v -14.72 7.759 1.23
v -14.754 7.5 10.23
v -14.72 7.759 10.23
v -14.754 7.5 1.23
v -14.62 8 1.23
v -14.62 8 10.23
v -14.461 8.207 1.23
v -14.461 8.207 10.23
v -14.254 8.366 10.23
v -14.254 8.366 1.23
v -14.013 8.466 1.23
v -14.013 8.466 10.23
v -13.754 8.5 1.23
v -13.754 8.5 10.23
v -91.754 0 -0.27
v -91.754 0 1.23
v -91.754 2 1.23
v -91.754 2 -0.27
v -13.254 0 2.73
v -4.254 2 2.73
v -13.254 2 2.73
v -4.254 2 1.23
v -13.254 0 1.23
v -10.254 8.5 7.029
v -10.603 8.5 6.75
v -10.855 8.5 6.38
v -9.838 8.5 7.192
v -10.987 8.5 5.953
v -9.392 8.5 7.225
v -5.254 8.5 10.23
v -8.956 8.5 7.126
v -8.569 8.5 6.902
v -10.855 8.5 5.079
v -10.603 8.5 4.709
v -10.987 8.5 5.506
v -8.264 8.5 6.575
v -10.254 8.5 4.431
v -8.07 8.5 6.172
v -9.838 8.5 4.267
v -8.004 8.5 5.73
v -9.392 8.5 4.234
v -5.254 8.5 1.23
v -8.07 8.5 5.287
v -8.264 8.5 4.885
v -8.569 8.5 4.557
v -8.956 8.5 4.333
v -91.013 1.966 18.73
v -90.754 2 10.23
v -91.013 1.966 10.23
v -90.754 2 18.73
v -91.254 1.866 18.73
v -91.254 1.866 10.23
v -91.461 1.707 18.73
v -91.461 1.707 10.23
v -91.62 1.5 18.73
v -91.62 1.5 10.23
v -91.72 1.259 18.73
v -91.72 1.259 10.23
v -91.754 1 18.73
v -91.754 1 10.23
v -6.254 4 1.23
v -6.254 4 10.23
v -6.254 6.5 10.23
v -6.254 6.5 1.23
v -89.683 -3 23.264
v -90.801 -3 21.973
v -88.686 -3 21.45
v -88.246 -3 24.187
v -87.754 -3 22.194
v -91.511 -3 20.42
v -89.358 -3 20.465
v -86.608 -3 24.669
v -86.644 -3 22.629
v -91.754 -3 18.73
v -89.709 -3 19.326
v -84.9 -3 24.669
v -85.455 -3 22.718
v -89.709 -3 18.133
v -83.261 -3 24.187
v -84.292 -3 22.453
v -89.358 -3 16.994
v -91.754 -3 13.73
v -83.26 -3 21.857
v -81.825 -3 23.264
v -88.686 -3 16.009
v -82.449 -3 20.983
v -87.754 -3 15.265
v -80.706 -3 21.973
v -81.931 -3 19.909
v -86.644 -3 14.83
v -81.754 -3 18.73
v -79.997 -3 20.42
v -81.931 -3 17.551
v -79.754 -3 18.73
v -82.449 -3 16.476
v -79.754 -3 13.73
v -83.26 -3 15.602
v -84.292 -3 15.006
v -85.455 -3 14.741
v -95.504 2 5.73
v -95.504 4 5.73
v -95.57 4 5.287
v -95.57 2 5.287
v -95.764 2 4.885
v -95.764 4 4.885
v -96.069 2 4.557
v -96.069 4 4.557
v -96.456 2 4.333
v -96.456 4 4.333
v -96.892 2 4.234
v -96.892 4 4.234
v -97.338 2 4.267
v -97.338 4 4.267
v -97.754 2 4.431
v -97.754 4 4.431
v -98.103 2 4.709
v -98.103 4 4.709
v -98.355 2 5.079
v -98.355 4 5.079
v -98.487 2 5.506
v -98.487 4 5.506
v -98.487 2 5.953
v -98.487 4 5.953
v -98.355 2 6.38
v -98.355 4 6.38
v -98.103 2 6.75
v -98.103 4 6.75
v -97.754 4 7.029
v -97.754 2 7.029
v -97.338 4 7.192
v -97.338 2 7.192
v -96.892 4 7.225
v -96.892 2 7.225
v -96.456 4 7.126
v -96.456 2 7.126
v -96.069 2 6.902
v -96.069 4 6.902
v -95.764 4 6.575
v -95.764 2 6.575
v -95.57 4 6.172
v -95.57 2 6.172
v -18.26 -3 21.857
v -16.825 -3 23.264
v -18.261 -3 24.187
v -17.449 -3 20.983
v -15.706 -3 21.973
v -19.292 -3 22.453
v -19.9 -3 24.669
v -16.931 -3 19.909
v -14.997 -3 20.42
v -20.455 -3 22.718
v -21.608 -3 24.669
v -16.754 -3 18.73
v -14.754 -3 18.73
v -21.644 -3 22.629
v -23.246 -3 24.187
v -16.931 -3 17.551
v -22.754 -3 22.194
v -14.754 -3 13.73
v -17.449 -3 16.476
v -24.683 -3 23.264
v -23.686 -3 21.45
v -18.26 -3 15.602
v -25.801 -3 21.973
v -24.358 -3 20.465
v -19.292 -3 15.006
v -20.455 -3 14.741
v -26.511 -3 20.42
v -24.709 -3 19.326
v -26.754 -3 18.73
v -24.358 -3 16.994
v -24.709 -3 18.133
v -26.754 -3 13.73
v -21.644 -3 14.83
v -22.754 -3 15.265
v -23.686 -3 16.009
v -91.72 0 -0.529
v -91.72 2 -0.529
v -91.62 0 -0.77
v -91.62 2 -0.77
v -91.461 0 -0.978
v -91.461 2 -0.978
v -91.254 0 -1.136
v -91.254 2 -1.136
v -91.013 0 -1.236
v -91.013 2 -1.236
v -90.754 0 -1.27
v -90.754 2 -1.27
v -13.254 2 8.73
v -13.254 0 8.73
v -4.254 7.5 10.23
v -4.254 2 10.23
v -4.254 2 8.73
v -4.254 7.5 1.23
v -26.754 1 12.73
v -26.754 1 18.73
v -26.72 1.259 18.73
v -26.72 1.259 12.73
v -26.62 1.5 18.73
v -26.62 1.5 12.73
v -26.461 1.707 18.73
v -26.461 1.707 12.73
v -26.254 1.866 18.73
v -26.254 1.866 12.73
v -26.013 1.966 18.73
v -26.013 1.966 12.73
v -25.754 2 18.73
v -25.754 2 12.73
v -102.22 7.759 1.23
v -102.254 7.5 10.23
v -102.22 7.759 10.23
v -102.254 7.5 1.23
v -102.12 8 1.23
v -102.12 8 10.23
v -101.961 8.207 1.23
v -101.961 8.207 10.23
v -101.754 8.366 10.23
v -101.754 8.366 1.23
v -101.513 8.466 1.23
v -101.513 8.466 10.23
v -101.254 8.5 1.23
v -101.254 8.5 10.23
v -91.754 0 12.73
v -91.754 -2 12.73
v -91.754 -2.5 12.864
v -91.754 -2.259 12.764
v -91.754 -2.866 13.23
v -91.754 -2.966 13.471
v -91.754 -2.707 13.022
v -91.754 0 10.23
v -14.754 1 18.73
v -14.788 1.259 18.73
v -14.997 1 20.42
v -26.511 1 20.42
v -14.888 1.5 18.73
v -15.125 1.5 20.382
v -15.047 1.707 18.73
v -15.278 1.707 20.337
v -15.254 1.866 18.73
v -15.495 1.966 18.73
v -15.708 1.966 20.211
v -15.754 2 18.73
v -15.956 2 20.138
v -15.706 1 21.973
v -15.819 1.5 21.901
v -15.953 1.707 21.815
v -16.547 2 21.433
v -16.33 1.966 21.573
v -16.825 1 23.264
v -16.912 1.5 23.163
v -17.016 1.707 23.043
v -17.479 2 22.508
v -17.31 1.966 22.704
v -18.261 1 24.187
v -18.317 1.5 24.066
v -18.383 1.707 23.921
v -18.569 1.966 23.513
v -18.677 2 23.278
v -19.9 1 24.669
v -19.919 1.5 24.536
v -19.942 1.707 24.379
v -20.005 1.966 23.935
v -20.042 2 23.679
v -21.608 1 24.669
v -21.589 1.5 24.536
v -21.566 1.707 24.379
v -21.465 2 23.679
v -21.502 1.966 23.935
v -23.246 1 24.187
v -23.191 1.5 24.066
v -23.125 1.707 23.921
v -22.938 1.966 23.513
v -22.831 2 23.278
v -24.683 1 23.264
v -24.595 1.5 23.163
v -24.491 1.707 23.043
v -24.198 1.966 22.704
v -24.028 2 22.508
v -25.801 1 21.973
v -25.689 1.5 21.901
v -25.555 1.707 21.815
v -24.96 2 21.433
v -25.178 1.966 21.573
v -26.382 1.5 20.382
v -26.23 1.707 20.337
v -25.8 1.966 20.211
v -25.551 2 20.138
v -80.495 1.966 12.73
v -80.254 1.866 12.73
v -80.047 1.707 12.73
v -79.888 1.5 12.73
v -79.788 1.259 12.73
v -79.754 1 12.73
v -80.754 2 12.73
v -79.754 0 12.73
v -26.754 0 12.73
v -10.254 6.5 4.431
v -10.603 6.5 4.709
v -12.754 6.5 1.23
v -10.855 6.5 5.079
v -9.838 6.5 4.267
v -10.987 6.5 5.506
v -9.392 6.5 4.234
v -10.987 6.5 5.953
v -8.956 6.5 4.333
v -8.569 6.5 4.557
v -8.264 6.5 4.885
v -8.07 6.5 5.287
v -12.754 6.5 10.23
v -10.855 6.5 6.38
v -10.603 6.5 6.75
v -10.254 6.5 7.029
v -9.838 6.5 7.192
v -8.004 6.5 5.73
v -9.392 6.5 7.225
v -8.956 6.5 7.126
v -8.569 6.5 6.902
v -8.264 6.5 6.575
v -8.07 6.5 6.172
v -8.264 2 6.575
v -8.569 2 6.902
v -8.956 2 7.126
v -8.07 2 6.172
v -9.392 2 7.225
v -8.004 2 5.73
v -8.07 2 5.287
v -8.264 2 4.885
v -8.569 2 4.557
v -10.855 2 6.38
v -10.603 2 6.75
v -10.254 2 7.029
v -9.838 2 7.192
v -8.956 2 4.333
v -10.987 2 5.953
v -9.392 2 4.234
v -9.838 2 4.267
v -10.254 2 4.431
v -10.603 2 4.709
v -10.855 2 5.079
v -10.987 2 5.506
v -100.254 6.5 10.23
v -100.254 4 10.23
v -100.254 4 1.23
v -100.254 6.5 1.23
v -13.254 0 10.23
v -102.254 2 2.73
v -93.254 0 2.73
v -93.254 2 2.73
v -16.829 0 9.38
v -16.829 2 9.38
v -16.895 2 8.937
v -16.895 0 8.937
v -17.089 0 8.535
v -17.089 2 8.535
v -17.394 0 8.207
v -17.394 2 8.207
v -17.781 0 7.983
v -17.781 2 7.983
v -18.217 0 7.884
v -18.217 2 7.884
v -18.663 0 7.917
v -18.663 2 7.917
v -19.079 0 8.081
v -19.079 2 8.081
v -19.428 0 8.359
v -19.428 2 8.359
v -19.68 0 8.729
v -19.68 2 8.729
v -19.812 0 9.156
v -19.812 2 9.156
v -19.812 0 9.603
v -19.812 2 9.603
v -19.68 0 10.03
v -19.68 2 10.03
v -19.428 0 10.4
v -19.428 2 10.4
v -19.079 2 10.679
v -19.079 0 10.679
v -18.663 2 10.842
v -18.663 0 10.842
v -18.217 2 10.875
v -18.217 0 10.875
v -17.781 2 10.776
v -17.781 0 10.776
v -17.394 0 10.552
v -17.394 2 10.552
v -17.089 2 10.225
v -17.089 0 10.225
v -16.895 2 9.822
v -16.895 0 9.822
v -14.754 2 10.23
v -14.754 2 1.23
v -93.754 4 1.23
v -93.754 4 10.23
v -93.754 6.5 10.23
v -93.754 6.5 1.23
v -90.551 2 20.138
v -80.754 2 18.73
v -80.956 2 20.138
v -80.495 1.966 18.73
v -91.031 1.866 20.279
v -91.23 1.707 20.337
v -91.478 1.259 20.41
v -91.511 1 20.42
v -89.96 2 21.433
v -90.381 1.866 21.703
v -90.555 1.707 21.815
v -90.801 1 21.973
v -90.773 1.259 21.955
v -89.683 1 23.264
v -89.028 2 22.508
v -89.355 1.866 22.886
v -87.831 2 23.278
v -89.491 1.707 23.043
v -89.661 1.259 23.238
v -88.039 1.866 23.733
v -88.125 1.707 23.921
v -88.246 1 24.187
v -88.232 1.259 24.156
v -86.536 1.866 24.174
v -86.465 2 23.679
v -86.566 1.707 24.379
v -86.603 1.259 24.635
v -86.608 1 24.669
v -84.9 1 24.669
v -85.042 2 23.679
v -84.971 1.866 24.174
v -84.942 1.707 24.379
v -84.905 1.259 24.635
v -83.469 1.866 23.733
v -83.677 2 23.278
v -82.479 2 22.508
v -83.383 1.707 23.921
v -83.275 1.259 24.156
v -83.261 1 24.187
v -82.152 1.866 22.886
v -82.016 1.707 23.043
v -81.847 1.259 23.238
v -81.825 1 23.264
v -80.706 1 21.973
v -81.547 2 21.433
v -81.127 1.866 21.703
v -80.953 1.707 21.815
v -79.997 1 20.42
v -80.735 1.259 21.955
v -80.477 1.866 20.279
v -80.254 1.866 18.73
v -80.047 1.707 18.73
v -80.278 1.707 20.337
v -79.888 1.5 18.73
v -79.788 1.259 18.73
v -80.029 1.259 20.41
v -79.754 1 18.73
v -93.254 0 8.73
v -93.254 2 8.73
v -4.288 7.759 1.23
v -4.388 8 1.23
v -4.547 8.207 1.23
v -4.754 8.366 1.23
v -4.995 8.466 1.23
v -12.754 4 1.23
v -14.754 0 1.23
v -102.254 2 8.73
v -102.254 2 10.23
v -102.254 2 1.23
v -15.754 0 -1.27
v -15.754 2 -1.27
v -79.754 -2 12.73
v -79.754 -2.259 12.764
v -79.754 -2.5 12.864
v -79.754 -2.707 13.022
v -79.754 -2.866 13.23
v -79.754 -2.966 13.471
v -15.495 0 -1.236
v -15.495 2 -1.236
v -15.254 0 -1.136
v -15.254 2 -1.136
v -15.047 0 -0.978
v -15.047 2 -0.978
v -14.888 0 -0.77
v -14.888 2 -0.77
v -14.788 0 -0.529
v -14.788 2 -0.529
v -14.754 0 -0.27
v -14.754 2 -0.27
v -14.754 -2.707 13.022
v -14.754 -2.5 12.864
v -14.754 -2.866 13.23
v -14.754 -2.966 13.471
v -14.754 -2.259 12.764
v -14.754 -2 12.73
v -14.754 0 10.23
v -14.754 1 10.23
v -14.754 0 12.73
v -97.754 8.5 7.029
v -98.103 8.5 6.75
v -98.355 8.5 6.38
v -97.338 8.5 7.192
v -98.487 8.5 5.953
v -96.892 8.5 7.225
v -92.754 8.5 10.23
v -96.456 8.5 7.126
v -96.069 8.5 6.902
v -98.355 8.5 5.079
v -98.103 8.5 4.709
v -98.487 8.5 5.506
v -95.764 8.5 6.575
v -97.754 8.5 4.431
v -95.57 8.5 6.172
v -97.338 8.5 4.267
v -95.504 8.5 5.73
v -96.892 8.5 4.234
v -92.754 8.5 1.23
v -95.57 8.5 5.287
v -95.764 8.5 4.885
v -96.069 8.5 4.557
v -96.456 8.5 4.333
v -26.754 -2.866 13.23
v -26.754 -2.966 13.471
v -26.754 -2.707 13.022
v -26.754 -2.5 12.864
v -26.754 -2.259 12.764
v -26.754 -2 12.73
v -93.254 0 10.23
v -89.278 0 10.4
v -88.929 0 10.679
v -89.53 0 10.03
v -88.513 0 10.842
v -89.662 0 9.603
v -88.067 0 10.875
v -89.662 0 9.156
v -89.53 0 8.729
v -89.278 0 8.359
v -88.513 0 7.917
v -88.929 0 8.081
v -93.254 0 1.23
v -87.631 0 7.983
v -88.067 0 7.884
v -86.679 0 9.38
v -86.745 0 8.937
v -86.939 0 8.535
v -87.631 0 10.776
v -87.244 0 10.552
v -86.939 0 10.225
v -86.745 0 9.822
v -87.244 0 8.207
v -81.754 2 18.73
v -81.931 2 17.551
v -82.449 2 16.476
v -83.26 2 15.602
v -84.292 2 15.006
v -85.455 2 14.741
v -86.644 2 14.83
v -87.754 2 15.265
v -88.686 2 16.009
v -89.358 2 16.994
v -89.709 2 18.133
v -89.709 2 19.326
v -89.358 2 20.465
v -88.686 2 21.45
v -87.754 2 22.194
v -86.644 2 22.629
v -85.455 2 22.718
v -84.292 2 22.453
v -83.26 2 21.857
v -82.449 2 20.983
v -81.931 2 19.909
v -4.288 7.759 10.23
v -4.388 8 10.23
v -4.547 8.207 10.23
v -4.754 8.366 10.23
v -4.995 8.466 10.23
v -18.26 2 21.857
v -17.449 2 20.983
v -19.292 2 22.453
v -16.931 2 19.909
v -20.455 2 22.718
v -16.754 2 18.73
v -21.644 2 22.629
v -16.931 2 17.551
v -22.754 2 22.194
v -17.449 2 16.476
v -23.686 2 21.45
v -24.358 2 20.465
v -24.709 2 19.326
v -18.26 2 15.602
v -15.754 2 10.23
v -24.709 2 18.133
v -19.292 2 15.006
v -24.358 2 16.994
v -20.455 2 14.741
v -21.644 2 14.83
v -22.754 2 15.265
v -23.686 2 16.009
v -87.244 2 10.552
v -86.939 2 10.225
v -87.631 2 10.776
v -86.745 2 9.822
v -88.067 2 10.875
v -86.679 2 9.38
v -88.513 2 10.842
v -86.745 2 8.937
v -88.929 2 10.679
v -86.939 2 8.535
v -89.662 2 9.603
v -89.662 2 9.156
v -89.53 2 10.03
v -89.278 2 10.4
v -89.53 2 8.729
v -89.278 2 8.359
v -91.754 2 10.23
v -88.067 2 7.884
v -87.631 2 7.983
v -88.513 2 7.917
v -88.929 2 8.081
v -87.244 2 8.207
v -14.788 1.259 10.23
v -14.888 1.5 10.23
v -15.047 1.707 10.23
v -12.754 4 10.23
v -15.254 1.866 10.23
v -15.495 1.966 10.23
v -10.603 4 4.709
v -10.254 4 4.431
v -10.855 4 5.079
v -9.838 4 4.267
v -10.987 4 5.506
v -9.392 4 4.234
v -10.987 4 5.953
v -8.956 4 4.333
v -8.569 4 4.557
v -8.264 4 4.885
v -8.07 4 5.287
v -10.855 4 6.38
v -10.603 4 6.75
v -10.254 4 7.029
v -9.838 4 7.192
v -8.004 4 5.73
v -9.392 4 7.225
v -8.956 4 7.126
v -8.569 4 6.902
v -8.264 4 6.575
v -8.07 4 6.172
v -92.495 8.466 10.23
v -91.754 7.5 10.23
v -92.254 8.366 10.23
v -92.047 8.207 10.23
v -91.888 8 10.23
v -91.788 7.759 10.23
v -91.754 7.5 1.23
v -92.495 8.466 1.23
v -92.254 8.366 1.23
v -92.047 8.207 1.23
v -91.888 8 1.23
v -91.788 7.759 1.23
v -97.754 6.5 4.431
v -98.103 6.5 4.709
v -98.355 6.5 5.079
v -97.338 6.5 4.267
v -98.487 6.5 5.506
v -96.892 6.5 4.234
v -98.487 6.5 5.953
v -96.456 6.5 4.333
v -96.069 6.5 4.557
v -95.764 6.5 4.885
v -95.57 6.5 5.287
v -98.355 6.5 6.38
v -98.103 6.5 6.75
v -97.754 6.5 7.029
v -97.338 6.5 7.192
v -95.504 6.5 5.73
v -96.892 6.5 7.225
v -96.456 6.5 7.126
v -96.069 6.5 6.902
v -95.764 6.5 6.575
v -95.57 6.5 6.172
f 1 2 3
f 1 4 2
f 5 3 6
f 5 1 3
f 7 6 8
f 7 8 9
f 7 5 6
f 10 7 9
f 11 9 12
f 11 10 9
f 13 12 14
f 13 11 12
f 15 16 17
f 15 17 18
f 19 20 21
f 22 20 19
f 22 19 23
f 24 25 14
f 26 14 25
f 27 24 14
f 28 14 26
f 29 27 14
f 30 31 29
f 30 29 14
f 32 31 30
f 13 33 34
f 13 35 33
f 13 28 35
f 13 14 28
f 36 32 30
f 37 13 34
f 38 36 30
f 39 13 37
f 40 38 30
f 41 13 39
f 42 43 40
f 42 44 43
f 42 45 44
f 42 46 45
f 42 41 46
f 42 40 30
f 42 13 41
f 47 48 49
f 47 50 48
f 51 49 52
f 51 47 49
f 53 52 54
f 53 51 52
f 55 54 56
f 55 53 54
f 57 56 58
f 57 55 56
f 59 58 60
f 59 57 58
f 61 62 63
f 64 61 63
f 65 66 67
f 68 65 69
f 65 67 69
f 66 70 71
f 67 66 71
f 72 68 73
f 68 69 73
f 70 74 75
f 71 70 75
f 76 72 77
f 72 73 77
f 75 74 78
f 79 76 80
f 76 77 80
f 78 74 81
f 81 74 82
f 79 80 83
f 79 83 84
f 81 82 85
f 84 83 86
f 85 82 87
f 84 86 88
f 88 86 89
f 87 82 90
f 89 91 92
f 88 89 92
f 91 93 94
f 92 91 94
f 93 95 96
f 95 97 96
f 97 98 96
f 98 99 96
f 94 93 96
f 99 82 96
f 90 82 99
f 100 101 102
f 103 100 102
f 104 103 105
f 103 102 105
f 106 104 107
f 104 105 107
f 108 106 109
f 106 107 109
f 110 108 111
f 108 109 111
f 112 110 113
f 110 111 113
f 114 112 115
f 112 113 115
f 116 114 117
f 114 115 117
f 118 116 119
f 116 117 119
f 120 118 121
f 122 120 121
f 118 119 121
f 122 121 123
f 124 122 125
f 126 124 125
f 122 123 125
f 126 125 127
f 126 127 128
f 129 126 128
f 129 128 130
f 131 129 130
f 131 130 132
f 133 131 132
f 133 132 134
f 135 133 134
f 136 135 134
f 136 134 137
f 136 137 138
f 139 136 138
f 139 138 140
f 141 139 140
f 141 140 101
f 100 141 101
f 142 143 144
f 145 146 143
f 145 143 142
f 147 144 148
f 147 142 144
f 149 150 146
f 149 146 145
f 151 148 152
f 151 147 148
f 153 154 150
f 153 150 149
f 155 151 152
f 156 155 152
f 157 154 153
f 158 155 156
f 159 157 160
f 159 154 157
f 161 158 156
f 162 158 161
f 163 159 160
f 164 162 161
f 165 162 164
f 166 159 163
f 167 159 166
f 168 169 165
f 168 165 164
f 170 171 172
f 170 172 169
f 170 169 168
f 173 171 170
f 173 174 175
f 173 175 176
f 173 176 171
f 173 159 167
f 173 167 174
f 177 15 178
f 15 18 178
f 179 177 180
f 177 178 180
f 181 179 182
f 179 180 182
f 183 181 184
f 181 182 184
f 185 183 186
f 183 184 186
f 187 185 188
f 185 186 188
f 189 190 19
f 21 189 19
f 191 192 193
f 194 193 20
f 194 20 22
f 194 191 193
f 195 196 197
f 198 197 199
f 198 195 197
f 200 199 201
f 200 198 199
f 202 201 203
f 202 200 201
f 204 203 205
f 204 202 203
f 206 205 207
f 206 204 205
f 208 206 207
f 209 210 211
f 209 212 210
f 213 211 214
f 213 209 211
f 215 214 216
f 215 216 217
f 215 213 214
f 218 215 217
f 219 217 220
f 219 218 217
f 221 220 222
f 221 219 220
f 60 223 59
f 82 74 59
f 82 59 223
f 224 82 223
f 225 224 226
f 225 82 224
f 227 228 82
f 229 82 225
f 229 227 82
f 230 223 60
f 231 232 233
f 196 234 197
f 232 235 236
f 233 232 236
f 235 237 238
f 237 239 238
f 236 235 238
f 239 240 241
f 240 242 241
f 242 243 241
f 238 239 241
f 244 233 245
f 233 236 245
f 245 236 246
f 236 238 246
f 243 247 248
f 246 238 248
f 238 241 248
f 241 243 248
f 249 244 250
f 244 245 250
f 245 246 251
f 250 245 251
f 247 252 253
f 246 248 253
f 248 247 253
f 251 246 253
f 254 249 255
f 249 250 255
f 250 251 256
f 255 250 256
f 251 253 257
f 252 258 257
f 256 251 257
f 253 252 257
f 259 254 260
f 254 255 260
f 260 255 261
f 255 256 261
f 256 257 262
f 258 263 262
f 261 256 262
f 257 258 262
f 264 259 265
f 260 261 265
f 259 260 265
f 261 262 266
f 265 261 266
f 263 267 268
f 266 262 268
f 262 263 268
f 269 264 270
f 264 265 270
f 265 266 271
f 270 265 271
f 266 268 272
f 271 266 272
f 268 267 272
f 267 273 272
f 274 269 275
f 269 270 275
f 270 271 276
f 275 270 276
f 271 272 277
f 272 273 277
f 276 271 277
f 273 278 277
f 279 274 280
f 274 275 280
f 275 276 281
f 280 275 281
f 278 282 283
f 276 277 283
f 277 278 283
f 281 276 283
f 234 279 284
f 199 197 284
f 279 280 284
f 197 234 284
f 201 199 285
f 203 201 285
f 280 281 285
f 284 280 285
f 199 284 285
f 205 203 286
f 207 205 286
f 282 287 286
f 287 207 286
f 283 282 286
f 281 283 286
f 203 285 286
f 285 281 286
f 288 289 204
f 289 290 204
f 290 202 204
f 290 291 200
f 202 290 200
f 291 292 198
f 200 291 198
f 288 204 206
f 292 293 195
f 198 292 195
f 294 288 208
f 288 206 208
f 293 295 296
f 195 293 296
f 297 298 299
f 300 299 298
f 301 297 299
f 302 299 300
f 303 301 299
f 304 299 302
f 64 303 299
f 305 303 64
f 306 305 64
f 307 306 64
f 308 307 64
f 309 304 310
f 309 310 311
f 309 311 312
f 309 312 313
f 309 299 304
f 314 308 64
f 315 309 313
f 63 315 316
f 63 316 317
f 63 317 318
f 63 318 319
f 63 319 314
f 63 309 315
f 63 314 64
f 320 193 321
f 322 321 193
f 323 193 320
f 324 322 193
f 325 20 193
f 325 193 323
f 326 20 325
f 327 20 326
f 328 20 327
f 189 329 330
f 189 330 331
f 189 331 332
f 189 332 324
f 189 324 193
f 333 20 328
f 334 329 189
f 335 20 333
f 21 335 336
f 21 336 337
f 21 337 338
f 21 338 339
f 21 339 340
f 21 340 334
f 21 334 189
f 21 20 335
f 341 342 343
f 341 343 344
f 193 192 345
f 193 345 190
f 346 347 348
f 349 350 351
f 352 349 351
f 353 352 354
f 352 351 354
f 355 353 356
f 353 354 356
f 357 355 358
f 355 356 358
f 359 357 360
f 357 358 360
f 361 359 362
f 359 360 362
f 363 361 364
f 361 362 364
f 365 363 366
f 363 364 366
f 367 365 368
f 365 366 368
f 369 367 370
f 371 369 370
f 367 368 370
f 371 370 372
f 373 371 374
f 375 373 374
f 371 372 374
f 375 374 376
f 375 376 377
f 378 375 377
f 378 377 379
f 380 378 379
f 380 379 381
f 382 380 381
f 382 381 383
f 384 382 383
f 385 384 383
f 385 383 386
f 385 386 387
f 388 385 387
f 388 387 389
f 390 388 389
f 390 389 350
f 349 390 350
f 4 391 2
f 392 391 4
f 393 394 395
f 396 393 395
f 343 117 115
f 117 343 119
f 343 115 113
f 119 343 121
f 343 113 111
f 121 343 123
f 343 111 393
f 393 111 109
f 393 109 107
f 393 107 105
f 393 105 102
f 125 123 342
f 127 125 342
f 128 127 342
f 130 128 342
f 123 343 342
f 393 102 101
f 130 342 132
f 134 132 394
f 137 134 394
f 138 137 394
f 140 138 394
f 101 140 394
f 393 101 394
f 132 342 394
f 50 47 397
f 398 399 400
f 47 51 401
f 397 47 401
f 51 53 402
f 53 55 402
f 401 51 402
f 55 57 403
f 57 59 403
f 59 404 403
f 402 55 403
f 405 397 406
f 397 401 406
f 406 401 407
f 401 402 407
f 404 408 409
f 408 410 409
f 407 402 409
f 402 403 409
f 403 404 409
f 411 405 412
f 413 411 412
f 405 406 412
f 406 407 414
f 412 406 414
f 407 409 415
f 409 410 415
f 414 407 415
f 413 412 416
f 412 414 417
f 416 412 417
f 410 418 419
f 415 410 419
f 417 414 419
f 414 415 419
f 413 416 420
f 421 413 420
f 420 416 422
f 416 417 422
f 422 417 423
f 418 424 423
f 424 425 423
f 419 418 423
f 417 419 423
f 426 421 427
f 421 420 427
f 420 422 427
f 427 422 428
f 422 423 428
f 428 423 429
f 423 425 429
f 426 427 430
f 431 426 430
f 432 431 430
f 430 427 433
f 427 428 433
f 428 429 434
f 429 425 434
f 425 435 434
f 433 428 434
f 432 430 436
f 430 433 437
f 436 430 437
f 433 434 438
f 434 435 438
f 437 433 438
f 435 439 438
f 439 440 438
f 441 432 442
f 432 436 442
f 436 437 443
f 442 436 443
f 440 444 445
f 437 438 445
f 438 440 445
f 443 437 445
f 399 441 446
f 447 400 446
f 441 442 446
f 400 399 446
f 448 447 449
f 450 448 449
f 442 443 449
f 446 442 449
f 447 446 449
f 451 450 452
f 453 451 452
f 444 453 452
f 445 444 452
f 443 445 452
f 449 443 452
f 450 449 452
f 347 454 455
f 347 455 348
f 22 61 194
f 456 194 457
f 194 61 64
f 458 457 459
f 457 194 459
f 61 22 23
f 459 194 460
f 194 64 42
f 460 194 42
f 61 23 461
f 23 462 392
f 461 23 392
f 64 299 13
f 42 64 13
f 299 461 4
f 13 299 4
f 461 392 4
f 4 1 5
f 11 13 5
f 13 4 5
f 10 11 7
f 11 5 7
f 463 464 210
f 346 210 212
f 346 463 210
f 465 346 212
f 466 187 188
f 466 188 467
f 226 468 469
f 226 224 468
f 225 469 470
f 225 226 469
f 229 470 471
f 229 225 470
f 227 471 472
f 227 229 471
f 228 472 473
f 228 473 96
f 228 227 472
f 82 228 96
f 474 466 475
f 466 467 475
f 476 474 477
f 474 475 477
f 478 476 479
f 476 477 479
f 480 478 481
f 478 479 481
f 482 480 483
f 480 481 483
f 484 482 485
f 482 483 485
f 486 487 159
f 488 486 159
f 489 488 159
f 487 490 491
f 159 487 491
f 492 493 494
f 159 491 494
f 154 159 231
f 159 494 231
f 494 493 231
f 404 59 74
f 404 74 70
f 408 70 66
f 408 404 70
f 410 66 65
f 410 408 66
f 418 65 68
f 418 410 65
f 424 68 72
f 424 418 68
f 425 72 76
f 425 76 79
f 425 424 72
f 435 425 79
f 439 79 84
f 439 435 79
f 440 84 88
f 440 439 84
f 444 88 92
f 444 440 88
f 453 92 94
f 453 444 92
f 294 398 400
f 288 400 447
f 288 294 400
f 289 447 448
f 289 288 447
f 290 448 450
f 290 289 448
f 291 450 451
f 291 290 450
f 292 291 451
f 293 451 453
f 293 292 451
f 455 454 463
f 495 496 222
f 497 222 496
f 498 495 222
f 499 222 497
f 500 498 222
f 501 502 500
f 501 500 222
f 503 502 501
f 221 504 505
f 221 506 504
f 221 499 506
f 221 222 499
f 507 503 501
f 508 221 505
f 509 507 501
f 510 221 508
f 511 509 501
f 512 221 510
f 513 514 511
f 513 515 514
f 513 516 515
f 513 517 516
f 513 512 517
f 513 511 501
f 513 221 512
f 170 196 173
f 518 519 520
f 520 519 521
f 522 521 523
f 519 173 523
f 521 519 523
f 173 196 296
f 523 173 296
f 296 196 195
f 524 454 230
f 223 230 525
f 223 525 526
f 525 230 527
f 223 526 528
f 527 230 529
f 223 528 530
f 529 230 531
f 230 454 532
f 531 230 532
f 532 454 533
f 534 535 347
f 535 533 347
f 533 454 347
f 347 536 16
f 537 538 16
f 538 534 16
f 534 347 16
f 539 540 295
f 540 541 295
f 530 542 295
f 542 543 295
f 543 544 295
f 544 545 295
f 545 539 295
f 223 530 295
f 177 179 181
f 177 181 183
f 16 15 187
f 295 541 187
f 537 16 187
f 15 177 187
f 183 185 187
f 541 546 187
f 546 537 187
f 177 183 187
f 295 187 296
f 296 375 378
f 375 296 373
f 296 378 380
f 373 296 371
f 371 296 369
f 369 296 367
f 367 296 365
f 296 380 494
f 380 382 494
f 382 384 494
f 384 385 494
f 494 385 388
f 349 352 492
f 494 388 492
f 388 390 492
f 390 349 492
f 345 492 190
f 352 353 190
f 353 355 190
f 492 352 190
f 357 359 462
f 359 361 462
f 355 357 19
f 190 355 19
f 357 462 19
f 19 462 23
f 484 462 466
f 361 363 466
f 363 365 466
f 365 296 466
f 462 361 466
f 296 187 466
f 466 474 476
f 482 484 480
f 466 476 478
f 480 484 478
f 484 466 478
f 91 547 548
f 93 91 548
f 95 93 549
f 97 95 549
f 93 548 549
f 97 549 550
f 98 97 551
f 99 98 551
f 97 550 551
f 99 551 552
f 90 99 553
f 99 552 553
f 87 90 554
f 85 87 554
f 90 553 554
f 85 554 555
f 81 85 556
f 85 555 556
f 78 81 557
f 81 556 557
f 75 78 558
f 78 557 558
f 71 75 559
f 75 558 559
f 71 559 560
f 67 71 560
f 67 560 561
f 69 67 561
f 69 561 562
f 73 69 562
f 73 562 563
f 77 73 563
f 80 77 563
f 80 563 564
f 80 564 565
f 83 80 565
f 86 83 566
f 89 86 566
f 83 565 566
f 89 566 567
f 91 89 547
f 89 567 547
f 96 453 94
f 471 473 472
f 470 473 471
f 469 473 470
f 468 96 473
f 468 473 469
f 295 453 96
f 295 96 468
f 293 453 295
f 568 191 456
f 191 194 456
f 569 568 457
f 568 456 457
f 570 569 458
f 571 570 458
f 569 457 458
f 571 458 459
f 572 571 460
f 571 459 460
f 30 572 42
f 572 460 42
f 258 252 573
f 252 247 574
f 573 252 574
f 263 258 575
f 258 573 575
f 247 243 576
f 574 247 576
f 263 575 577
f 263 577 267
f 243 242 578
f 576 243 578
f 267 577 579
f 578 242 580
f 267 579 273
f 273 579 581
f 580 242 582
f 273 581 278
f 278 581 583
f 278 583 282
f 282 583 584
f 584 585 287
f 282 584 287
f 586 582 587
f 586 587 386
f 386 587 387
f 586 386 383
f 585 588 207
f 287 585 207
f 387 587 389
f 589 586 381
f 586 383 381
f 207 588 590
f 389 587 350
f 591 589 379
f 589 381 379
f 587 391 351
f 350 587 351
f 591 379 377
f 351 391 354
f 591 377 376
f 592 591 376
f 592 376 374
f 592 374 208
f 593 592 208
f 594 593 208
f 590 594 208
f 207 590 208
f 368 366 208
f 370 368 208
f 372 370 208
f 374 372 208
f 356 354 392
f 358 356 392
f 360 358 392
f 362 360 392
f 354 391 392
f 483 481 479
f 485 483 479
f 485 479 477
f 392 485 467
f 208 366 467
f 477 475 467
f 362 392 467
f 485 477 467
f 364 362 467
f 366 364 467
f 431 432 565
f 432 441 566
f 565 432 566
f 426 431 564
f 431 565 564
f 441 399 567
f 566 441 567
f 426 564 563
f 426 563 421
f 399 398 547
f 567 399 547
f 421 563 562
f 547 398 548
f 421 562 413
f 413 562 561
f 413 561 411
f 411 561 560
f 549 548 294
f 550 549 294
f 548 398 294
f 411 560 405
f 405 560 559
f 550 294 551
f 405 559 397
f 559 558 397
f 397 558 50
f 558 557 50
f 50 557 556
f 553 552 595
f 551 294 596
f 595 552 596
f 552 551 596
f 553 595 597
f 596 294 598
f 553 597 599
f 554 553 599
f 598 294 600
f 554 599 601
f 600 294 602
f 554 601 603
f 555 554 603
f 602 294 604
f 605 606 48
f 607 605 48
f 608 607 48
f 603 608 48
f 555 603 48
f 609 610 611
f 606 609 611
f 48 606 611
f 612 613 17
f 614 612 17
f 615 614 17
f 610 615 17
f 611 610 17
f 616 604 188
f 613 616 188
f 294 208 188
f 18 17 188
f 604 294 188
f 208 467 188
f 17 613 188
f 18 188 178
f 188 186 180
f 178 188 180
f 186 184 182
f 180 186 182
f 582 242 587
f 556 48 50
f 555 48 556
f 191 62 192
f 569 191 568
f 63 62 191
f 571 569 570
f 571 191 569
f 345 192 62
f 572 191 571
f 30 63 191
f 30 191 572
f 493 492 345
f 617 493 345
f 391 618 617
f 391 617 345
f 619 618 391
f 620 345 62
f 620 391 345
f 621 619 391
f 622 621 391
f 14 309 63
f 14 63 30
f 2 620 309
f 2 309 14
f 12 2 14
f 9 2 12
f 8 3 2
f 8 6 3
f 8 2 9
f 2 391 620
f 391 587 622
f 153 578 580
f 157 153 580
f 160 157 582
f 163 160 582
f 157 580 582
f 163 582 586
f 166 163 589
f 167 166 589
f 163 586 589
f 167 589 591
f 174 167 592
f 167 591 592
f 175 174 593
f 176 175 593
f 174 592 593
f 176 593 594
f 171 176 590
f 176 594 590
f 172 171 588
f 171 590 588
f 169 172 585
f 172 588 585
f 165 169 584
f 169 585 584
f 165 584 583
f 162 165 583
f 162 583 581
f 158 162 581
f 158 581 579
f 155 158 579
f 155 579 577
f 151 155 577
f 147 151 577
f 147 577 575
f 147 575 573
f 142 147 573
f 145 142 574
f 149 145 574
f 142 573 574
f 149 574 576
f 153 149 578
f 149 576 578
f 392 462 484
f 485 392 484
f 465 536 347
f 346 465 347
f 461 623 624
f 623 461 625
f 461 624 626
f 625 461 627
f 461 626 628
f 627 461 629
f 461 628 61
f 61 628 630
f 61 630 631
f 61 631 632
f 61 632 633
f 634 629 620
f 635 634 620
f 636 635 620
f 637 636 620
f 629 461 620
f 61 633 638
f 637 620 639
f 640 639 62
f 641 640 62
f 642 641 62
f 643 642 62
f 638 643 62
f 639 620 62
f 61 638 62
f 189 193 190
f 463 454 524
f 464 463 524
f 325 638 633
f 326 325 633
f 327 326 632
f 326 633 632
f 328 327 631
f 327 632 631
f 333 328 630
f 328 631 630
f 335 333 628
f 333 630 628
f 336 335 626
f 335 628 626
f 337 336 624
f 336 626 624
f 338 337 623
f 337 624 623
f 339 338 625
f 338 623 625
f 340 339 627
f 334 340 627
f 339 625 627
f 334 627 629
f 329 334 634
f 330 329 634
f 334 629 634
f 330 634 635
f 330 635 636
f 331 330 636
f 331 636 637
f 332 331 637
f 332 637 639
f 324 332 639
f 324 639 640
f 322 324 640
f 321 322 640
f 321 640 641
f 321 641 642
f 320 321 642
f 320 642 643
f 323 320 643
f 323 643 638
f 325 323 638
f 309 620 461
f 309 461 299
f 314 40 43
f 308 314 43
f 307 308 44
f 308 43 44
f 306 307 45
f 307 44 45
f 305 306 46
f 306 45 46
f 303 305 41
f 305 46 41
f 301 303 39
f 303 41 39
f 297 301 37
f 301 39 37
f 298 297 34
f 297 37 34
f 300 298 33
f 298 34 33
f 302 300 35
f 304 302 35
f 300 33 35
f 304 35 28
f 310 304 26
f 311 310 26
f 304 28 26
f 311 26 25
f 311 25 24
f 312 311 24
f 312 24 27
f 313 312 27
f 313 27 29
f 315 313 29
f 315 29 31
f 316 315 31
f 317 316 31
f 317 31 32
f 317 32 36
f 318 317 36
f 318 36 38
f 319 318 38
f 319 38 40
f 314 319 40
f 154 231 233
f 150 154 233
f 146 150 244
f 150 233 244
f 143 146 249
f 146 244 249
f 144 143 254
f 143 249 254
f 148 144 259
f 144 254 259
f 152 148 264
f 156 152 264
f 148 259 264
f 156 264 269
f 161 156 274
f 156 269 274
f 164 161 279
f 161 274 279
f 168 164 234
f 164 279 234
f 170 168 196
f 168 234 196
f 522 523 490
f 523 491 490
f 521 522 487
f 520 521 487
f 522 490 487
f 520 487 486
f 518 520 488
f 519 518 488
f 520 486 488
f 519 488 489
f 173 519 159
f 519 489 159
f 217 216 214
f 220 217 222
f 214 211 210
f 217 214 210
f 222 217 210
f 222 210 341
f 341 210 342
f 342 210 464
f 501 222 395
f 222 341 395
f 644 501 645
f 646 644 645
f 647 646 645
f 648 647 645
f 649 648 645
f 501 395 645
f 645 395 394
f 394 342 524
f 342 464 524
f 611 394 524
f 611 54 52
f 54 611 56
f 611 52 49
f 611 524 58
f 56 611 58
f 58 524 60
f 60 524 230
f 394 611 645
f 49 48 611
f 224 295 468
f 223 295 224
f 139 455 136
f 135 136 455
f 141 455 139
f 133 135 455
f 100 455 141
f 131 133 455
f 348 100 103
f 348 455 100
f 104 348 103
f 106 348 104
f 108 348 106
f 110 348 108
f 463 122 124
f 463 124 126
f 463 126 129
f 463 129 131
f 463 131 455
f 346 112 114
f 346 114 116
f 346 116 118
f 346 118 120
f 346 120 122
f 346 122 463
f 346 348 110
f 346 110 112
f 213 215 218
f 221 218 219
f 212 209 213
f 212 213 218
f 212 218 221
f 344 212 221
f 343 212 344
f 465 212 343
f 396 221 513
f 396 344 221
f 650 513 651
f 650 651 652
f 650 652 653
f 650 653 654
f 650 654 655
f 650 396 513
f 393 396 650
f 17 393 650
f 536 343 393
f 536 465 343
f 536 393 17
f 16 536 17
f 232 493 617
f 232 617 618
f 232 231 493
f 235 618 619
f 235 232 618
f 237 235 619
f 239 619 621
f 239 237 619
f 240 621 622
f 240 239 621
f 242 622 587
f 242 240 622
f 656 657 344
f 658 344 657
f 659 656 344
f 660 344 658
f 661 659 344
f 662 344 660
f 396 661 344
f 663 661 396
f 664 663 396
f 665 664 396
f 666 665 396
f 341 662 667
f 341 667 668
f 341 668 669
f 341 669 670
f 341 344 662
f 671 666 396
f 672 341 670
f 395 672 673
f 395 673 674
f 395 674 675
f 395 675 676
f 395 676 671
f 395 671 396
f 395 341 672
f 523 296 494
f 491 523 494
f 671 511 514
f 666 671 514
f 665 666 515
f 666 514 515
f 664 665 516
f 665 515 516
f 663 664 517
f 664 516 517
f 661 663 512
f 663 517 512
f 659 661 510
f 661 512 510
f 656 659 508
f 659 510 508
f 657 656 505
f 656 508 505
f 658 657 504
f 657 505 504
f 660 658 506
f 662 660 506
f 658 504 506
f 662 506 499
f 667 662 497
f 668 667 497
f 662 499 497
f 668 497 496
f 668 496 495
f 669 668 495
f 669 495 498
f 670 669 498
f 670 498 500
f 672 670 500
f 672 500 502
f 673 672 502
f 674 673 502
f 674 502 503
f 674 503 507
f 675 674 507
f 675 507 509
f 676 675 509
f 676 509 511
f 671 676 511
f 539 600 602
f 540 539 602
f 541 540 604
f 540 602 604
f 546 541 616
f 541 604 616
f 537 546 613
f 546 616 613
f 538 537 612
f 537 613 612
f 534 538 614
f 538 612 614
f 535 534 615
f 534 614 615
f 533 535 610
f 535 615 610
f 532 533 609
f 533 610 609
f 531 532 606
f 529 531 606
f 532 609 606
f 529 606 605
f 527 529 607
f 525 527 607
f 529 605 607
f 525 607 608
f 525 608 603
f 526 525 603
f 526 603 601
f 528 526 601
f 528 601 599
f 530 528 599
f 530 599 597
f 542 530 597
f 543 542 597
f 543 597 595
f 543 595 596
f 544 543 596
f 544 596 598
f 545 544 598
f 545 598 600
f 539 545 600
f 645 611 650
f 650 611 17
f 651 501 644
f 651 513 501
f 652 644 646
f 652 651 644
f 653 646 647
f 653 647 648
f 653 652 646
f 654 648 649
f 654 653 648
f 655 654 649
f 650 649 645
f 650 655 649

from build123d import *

# Parameters (mm, degrees)
SKETCH1_W           = 77
SKETCH1_H           = 14
BOSS_EXTRUDE1_DEPTH = 2
SKETCH3_W           = 9
SKETCH3_H           = 2
BOSS_EXTRUDE2_DEPTH = 10.5
SKETCH4_W           = 9
SKETCH4_H           = 2
BOSS_EXTRUDE3_DEPTH = 10.5
SKETCH5_W           = 10.5
SKETCH5_H           = 9
BOSS_EXTRUDE4_DEPTH = 6.5
SKETCH6_W           = 6.5
SKETCH6_H           = 2.5
CUT_EXTRUDE1_DEPTH  = 9
SKETCH8_R           = 1.5
CUT_EXTRUDE2_DEPTH  = 8.5
SKETCH10_W          = 9
SKETCH10_H          = 6
CUT_EXTRUDE4_DEPTH  = 2
CHAMFER1_SIZE       = 9
CHAMFER1_SIZE2      = 2
BOSS_EXTRUDE5_DEPTH = 5
SKETCH13_R          = 4
CUT_EXTRUDE5_DEPTH  = 5
FILLET3_R           = 1


with BuildPart() as part:
    # Sketch1 → Boss-Extrude1 (new body)
    with BuildSketch(Plane(origin=(0, 0, 0), x_dir=(1, 0, 0), z_dir=(0, 1, 0))):
        with Locations((-53.253755964, -5.729579977)):
            Rectangle(SKETCH1_W, SKETCH1_H)
    extrude(amount=BOSS_EXTRUDE1_DEPTH)

    # Sketch3 → Boss-Extrude2 (add)
    with BuildSketch(Plane.ZY.offset(91.753755964)):
        with Locations((5.729579977, 1)):
            Rectangle(SKETCH3_W, SKETCH3_H)
    extrude(amount=BOSS_EXTRUDE2_DEPTH)

    # Sketch4 → Boss-Extrude3 (add)
    with BuildSketch(Plane(origin=(-14.753755964, 0, 0), x_dir=(0, 0, -1), z_dir=(1, 0, 0))):
        with Locations((-5.729579977, 1)):
            Rectangle(SKETCH4_W, SKETCH4_H)
    extrude(amount=BOSS_EXTRUDE3_DEPTH)

    # Sketch5 → Boss-Extrude4 (add)
    with BuildSketch(Plane(origin=(0, 2, 0), x_dir=(1, 0, 0), z_dir=(0, 1, 0))):
        with Locations((-97.003755964, -5.729579977)):
            Rectangle(SKETCH5_W, SKETCH5_H)
        with Locations((-9.503755964, -5.729579977)):
            Rectangle(SKETCH5_W, SKETCH5_H)
    extrude(amount=BOSS_EXTRUDE4_DEPTH)

    # Sketch6 → Cut-Extrude1 (cut)
    with BuildSketch(Plane.XY.offset(10.229579977)):
        with Locations((-9.503755964, 5.25)):
            Rectangle(SKETCH6_W, SKETCH6_H)
        with Locations((-97.003755964, 5.25)):
            Rectangle(SKETCH6_W, SKETCH6_H)
    extrude(amount=-CUT_EXTRUDE1_DEPTH, mode=Mode.SUBTRACT)

    # Sketch8 → Cut-Extrude2 (cut)
    with BuildSketch(Plane(origin=(0, 8.5, 0), x_dir=(1, 0, 0), z_dir=(0, 1, 0))):
        with Locations((-88.178755964, -9.379579977)):
            Circle(SKETCH8_R)
        with Locations((-18.328755964, -9.379579977)):
            Circle(SKETCH8_R)
        with Locations((-97.003755964, -5.729579977)):
            Circle(SKETCH8_R)
        with Locations((-9.503755964, -5.729579977)):
            Circle(SKETCH8_R)
    extrude(amount=-CUT_EXTRUDE2_DEPTH, mode=Mode.SUBTRACT)

    # Sketch10 → Cut-Extrude4 (cut)
    with BuildSketch(Plane(origin=(0, 0, 0), x_dir=(-1, 0, 0), z_dir=(0, -1, 0))):
        with Locations((97.753755964, -5.729579977)):
            Rectangle(SKETCH10_W, SKETCH10_H)
        with Locations((8.753755964, -5.729579977)):
            Rectangle(SKETCH10_W, SKETCH10_H)
    extrude(amount=-CUT_EXTRUDE4_DEPTH, mode=Mode.SUBTRACT)

    # Chamfer1
    chamfer1_edges = [part.edges().sort_by_distance(p)[0] for p in [
        (-102.253755964, 0, 1.979579977),
        (-4.253755964, 0, 9.479579977),
        (-4.253755964, 0, 1.979579977),
        (-102.253755964, 0, 9.479579977),
    ]]
    chamfer1_side = [part.faces().sort_by_distance(p)[0] for p in [
        (-53.253755964, 0, 5.684508499),
    ]]
    chamfer(chamfer1_edges, length=CHAMFER1_SIZE, length2=CHAMFER1_SIZE2, reference=chamfer1_side[0])

    # Sketch12 → Boss-Extrude5 (add)
    with BuildSketch(Plane(origin=(0, 2, 0), x_dir=(1, 0, 0), z_dir=(0, 1, 0))):
        with BuildLine():
            Line((-26.753755964, -12.729579977), (-14.753755964, -12.729579977))
            Line((-14.753755964, -12.729579977), (-14.753755964, -18.729579977))
            ThreePointArc((-14.753755964, -18.729579977), (-20.753755964, -24.729579977), (-26.753755964, -18.729579977))
            Line((-26.753755964, -18.729579977), (-26.753755964, -12.729579977))
        make_face()
        with BuildLine():
            Line((-91.753755964, -12.729579977), (-91.753755964, -18.729579977))
            ThreePointArc((-91.753755964, -18.729579977), (-85.753755964, -24.729579977), (-79.753755964, -18.729579977))
            Line((-79.753755964, -18.729579977), (-79.753755964, -12.729579977))
            Line((-79.753755964, -12.729579977), (-91.753755964, -12.729579977))
        make_face()
    extrude(amount=-BOSS_EXTRUDE5_DEPTH)

    # Sketch13 → Cut-Extrude5 (cut)
    with BuildSketch(Plane(origin=(0, 2, 0), x_dir=(1, 0, 0), z_dir=(0, 1, 0))):
        with Locations((-85.753755964, -18.729579977)):
            Circle(SKETCH13_R)
        with Locations((-20.753755964, -18.729579977)):
            Circle(SKETCH13_R)
    extrude(amount=-CUT_EXTRUDE5_DEPTH, mode=Mode.SUBTRACT)

    # Fillet3
    fillet3_edges = [part.edges().sort_by_distance(p)[0] for p in [
        (-85.753755964, -3, 12.729579977),
        (-85.753755964, 2, 24.729579977),
        (-79.753755964, 2, 15.729579977),
        (-20.753755964, -3, 12.729579977),
        (-20.753755964, 2, 24.729579977),
        (-26.753755964, 2, 15.729579977),
        (-91.753755964, 8.5, 5.729579977),
        (-102.253755964, 8.5, 5.729579977),
        (-14.753755964, 8.5, 5.729579977),
        (-4.253755964, 8.5, 5.729579977),
        (-91.753755964, 1, -1.270420023),
        (-14.753755964, 1, -1.270420023),
    ]]
    fillet(fillet3_edges, radius=FILLET3_R)


solid = part.part
